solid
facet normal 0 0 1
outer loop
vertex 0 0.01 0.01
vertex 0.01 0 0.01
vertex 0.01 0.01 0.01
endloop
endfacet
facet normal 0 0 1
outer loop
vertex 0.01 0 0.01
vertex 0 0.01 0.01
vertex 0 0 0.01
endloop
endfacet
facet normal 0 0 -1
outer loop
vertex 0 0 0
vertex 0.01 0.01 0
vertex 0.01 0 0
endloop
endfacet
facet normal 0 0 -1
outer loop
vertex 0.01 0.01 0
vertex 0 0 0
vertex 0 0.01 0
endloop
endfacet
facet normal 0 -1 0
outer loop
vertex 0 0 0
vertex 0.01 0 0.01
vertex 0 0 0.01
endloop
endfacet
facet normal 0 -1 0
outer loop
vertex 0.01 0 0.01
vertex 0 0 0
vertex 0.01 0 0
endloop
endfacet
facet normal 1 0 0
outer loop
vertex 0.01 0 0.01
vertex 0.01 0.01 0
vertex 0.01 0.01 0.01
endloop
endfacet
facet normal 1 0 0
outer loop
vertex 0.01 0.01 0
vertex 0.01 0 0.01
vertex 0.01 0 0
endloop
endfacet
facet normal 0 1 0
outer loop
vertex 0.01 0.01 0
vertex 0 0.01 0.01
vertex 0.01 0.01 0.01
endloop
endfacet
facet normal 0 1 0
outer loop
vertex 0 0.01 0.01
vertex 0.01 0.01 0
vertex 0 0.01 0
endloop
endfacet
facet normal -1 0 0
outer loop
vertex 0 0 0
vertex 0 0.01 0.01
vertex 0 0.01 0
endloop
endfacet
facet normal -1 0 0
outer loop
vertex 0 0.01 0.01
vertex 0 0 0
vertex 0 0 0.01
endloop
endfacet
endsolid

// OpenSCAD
/***
 * @function mate_phase_forwarding
 * @brief Verify that mate tooth phase reaches the shared placement engine.
 * @return {geometry} Small validation solid.
 */
include <../../src/common/curve_gears_math.scad>

samples=240;
modul=.8;
tooth_number=34;
points=[for(i=[0:samples-1]) [10*cos(360*i/samples),10*sin(360*i/samples)]];
arc=_cg_polyline_arc_table(points);
perimeter=arc[len(arc)-1][1];
body=_cg_canonical_body_polyline(points,_cg_dedendum(modul));
candidate=_cg_reference_tooth_candidate(modul*tooth_number/2,modul,tooth_number,20);
zero=_cg_placement_result(points,arc,perimeter,body,modul,tooth_number,7,candidate,20,0,false,undef,undef);
phased=_cg_placement_result(points,arc,perimeter,body,modul,tooth_number,7,candidate,20,90,false,undef,undef);

assert(zero[0]=="placed" && phased[0]=="placed","phase forwarding fixture could not place both teeth");
assert(abs(zero[3]-phased[3])>1e-6,
    "non-zero tooth phase did not change the placement target");
assert(abs(_cg_vlen(zero[4][0])-_cg_vlen(phased[4][0]))<.01,
    "tooth phase changed the reference pitch radius");
echo("stage=mate severity=info code=TOOTH_PHASE_FORWARDING PASS");
cube([.01,.01,.01]);
